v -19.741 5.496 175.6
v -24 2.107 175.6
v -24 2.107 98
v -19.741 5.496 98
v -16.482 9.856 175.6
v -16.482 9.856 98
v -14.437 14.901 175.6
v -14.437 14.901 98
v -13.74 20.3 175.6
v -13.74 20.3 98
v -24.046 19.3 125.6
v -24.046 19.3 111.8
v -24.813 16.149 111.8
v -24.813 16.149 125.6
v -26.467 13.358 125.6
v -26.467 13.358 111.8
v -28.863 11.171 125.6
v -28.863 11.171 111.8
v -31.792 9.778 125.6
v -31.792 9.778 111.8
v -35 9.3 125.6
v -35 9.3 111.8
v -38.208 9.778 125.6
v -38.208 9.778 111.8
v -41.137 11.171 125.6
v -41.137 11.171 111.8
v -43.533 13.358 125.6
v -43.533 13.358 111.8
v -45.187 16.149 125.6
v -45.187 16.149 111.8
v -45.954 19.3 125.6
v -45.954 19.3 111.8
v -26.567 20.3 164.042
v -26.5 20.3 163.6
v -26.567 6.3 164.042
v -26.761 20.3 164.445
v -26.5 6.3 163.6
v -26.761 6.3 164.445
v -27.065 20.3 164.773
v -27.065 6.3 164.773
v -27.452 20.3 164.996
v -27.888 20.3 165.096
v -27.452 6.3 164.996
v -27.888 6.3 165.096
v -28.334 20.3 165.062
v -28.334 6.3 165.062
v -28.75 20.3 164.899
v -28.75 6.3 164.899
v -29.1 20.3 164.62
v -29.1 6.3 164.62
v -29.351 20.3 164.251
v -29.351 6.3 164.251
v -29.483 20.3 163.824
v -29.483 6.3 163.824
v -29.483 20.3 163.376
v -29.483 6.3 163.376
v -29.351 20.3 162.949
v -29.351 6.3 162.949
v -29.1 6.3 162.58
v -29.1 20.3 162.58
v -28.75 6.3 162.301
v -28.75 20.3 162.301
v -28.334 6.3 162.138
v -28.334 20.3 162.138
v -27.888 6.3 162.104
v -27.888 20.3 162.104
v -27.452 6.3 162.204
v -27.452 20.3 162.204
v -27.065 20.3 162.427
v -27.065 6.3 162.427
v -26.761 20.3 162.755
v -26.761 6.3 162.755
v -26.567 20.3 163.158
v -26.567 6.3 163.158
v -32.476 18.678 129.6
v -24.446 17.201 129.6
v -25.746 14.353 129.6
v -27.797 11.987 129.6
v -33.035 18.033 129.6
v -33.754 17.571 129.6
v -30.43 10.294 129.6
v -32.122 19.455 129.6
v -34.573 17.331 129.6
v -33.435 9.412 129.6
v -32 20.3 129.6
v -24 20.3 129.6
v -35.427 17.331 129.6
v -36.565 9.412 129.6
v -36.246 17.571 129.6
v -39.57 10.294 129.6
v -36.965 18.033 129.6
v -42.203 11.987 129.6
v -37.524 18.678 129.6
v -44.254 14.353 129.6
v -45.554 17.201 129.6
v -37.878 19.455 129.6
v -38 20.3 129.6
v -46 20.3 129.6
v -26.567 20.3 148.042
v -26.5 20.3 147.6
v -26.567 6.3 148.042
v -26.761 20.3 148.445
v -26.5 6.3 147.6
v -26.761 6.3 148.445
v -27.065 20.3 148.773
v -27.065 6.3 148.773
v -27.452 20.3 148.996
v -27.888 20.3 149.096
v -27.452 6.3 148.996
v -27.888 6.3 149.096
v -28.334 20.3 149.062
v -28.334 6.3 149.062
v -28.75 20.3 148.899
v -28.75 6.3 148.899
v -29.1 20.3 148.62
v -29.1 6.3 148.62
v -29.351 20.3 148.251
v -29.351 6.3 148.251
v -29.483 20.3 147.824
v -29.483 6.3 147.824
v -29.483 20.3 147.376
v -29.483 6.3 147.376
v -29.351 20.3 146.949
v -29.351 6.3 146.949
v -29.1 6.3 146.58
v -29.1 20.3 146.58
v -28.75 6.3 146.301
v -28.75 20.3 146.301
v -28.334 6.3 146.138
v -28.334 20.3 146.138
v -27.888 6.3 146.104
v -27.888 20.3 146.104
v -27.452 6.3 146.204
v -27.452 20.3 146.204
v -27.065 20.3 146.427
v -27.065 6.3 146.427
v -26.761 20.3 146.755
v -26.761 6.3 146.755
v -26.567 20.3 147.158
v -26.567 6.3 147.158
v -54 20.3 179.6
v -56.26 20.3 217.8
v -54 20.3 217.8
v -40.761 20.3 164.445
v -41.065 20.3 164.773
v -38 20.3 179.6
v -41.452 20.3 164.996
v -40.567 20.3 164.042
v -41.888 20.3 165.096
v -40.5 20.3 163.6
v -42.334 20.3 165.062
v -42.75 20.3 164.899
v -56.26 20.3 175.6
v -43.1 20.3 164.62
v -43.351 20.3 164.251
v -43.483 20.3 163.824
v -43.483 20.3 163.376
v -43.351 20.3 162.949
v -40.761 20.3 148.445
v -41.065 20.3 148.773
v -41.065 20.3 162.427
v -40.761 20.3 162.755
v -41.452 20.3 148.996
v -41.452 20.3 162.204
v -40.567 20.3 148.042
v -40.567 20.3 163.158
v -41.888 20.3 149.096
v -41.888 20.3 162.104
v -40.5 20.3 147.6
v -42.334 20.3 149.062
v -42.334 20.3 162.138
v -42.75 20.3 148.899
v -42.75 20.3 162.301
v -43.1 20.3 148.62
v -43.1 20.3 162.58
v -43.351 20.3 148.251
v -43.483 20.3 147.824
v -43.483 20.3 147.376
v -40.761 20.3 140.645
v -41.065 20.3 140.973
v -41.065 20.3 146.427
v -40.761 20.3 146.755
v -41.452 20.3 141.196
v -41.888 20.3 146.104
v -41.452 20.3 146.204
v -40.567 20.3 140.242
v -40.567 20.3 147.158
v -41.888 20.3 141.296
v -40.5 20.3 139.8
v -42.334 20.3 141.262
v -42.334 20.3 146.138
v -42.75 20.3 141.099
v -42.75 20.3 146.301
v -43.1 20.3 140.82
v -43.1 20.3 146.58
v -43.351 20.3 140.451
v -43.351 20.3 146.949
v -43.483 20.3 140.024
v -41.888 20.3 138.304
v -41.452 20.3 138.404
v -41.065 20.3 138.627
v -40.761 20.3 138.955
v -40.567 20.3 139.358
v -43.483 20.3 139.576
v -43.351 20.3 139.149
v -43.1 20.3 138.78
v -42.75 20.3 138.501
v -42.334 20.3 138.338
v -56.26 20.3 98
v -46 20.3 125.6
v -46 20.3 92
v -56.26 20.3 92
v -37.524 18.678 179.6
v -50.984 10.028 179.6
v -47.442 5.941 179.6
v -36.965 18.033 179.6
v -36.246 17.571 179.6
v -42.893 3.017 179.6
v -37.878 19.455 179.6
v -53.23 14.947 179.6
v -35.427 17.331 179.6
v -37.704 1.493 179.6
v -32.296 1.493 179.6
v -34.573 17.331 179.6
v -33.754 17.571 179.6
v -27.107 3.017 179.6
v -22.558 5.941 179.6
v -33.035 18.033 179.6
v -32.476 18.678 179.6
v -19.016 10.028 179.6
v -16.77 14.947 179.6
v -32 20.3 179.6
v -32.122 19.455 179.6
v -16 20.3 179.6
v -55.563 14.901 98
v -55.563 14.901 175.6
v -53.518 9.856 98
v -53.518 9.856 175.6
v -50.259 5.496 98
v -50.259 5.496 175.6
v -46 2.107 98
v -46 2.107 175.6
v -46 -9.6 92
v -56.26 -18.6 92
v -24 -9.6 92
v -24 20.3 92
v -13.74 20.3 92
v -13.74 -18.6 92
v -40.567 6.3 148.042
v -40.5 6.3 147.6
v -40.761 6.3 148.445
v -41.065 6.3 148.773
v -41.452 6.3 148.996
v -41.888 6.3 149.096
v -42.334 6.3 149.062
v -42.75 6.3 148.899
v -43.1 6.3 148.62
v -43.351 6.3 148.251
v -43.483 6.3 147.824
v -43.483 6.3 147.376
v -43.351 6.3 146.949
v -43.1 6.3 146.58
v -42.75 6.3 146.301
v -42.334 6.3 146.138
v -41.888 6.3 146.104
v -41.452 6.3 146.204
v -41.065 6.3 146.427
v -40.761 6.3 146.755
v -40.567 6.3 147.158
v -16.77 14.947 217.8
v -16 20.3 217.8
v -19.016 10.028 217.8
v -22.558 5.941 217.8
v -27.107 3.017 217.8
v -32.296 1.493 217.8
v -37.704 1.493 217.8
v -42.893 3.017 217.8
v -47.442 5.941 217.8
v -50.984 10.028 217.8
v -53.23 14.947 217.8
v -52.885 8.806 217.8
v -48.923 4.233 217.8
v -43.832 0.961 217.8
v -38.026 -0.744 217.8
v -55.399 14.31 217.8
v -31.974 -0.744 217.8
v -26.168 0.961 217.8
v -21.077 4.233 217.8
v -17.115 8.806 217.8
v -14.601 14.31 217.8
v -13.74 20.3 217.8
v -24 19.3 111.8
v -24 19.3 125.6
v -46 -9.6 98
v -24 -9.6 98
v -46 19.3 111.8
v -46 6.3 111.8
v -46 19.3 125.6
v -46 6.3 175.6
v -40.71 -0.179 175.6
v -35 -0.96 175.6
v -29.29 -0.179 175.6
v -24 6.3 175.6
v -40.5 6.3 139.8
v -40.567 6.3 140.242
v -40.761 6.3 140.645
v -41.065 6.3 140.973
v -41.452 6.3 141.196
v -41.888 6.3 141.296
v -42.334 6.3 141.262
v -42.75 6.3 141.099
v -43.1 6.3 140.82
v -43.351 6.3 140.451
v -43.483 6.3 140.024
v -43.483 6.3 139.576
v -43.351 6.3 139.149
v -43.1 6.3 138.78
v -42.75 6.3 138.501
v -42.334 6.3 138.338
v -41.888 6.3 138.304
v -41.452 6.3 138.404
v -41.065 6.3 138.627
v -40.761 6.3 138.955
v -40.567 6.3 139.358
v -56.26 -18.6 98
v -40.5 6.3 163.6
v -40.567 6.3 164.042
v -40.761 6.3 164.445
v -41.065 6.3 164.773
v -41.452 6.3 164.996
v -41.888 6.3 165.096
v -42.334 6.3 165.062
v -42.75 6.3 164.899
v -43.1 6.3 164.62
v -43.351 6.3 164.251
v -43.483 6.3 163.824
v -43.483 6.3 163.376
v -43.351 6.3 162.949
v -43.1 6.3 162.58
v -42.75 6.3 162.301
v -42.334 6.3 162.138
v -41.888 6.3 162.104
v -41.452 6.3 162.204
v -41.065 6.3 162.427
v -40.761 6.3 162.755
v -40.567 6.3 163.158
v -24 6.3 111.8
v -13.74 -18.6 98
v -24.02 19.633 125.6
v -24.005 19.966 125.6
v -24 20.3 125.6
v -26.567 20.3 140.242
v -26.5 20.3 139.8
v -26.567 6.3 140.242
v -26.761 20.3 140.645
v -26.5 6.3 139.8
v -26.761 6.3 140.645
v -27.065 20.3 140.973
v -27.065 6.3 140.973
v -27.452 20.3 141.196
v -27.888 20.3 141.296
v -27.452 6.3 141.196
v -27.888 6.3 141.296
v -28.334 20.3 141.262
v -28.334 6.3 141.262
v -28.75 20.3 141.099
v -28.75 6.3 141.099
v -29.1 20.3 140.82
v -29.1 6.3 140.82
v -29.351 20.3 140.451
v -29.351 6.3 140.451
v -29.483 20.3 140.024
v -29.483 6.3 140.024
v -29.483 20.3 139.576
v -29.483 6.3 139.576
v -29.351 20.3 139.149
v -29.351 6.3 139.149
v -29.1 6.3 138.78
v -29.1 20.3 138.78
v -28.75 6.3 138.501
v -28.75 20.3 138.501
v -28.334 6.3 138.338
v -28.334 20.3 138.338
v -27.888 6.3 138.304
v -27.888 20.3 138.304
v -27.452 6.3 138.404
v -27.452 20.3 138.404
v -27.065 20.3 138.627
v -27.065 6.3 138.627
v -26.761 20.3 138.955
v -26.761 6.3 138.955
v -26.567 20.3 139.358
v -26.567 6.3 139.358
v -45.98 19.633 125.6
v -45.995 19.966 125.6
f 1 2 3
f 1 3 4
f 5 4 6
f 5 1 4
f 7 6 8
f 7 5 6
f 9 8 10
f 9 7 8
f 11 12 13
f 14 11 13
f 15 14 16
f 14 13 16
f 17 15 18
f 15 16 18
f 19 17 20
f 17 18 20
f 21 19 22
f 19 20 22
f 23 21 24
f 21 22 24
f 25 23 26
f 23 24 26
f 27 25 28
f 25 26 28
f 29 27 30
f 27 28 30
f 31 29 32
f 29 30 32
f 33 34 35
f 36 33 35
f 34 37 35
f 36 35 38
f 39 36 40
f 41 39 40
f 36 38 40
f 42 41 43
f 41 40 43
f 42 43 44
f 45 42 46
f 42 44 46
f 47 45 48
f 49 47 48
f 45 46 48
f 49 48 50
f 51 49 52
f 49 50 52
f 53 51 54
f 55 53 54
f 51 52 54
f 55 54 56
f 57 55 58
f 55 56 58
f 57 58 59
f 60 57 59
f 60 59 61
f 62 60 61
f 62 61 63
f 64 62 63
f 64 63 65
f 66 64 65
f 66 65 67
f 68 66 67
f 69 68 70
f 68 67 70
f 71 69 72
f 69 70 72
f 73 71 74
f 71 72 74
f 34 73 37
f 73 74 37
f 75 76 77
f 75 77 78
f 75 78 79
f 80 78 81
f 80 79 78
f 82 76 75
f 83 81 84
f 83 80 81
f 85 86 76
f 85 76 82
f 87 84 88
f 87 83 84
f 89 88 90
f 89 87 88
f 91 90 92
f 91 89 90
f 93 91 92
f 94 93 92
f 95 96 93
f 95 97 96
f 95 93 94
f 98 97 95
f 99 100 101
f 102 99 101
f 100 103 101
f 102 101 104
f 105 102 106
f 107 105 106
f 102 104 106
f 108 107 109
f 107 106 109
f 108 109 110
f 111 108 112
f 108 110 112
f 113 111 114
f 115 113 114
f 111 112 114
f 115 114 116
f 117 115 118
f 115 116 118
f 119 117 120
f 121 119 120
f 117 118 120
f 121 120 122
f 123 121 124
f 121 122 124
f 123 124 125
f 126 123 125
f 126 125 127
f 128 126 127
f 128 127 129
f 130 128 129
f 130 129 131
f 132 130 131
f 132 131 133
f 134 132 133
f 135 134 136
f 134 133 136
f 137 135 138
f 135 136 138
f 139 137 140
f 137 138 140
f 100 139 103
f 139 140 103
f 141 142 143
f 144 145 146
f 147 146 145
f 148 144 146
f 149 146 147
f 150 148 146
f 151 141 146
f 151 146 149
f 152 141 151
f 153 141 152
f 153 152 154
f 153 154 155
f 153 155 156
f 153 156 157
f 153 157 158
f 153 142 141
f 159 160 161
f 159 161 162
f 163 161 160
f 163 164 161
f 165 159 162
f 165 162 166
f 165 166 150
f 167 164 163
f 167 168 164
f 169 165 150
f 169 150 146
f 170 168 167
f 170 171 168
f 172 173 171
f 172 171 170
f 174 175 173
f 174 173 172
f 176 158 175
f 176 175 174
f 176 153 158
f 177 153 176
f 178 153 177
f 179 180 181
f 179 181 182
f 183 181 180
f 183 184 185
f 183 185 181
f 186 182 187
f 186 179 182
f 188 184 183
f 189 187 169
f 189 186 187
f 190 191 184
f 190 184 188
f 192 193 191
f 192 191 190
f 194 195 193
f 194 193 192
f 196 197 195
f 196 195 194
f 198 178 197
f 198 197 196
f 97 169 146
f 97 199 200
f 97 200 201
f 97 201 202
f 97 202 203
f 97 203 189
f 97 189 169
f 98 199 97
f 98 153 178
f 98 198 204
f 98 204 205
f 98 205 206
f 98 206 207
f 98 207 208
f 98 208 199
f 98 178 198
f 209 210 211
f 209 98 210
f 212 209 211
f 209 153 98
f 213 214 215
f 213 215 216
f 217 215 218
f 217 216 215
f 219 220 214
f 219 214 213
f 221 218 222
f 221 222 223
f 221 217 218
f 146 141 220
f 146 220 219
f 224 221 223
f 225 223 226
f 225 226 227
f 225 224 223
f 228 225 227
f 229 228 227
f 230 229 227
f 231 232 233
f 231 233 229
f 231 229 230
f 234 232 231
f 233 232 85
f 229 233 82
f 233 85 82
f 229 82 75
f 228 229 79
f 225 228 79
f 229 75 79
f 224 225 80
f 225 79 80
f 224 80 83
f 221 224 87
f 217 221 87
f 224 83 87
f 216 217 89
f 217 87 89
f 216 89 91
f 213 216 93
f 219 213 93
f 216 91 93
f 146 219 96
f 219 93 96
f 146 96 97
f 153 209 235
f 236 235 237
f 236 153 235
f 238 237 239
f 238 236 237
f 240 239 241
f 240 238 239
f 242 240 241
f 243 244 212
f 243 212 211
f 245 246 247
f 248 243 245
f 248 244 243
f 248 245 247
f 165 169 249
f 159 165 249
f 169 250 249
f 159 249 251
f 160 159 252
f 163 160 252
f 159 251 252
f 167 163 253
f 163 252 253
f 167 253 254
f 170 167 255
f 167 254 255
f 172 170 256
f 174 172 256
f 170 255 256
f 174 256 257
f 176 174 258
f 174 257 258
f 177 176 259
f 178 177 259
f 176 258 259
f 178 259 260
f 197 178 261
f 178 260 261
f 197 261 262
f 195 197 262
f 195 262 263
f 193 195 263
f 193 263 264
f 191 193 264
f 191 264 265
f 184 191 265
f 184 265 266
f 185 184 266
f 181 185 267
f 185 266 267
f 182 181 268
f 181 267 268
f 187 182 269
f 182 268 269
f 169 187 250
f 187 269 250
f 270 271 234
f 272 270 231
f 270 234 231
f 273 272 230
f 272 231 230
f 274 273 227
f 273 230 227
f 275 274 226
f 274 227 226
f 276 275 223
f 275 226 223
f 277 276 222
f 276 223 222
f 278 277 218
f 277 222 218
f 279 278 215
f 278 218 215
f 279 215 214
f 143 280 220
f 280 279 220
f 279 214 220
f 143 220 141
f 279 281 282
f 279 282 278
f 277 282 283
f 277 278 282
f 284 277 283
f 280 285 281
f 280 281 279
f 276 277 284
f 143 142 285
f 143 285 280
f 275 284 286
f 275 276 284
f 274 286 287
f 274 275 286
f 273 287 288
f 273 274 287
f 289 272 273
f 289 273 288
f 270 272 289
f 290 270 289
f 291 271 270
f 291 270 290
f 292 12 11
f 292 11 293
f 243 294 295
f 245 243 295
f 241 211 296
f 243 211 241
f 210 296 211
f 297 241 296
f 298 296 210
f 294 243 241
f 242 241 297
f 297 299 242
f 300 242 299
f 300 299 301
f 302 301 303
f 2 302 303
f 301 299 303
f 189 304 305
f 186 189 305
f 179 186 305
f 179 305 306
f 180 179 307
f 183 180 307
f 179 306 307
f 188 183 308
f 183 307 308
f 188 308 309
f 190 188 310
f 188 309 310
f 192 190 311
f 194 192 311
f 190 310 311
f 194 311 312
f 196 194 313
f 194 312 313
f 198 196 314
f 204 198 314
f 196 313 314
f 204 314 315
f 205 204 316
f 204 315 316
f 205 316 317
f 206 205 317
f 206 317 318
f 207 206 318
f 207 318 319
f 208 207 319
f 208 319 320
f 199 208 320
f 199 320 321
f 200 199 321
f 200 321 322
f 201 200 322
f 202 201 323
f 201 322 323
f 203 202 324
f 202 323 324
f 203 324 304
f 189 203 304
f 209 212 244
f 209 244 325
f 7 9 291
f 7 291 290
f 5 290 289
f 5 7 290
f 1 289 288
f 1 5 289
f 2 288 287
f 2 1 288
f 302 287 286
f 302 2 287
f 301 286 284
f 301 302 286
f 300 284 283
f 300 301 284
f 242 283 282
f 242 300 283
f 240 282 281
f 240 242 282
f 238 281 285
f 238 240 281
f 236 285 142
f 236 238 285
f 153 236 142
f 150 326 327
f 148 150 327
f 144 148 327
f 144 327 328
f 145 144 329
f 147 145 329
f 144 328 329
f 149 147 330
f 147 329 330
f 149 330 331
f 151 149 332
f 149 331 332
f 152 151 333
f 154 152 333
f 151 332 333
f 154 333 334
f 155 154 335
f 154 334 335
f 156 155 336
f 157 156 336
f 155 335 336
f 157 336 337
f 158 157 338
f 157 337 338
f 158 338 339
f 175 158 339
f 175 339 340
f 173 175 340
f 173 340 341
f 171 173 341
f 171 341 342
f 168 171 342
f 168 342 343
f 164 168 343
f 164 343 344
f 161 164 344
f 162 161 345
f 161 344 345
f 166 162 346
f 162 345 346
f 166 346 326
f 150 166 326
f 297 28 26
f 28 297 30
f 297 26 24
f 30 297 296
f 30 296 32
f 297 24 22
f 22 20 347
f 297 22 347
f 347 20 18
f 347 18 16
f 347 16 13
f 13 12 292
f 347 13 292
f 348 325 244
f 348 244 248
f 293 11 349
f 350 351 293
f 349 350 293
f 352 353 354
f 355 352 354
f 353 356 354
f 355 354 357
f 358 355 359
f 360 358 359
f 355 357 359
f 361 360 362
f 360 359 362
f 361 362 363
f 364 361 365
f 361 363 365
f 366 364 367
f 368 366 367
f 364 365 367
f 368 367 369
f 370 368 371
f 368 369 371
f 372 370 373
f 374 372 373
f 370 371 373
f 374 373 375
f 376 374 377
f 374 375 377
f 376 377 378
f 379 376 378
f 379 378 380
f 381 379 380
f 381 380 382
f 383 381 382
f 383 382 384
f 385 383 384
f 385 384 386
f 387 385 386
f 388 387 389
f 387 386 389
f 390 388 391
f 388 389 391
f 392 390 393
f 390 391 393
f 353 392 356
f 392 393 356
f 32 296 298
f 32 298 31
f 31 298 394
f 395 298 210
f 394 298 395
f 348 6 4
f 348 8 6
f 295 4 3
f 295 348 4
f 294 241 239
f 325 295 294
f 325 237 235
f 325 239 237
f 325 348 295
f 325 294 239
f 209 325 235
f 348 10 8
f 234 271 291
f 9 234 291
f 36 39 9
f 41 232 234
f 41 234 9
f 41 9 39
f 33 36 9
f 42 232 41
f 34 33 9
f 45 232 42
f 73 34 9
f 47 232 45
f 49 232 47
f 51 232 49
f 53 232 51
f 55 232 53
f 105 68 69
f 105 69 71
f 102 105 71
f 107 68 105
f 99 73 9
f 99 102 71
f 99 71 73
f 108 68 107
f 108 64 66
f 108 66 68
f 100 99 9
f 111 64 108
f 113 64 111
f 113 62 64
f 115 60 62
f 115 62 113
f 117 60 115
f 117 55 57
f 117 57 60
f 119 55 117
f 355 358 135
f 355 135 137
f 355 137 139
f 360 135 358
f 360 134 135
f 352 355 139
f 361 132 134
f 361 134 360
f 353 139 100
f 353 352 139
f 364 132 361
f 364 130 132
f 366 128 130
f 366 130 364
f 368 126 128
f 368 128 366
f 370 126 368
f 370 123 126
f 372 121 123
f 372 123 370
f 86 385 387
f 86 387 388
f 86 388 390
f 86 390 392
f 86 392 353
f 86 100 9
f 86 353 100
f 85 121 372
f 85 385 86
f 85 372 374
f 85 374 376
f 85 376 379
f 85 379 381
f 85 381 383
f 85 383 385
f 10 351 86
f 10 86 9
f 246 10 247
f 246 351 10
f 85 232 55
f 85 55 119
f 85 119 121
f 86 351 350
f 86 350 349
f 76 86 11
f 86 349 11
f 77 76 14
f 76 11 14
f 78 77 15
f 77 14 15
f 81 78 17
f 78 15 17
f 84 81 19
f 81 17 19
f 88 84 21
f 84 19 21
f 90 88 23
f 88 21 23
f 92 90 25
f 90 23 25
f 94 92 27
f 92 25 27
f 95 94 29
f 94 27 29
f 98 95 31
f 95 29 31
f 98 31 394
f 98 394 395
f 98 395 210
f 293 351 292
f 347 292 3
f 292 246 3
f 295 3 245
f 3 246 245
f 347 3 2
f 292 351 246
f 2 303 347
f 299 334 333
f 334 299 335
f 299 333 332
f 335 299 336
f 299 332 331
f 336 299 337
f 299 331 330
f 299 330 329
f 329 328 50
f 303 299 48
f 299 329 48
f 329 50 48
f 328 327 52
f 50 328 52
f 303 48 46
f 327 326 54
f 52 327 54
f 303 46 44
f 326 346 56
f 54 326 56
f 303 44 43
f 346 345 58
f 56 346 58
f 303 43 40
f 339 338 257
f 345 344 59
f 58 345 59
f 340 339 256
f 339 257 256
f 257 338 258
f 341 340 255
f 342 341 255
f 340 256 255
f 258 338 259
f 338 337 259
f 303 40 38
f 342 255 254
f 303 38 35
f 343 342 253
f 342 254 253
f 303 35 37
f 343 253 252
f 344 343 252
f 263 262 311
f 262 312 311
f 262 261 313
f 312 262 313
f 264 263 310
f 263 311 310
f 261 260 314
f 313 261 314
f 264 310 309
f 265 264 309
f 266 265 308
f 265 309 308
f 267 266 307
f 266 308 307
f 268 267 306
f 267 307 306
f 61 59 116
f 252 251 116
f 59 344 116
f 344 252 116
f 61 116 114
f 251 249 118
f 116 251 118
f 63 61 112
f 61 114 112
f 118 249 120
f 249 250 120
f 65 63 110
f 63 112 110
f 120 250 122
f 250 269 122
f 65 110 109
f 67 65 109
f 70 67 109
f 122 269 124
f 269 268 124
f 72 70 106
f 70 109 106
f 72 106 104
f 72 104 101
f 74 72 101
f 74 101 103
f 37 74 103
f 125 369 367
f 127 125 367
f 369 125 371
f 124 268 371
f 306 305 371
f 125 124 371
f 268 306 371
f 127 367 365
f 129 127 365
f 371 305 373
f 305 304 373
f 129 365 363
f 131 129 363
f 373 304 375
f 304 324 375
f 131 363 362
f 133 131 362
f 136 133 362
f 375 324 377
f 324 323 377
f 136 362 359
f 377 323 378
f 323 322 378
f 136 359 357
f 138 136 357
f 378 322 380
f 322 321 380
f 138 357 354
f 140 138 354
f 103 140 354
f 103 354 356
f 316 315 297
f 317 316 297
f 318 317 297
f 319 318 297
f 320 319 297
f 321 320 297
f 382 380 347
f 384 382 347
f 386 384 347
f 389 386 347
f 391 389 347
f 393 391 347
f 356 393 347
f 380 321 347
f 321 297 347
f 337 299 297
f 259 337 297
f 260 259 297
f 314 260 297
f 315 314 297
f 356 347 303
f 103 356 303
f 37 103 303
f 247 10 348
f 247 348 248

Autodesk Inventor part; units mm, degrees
ref_plane "YZ Plane" through (0, 0, 0) normal (1, 0, 0) x (0, 1, 0)
ref_plane "XZ Plane" through (0, 0, 0) normal (0, 1, 0) x (-1, 0, 0)
ref_plane "XY Plane" through (0, 0, 0) normal (0, 0, 1) x (1, 0, 0)
sketch "Sketch1" plane through (0, 0, 0) normal (0, 1, 0) x (-1, 0, 0)
  line L0 (0, 0) -> (0, 62)
  line L1 (0, 62) -> (70, 62)
  line L2 (70, 62) -> (70, 0)
  line L3 (76, 0) -> (76, 68)
  line L4 (76, 68) -> (-6, 68)
  line L5 (-6, 68) -> (-6, 0)
  line L6 (70, 0) -> (76, 0)
  line L7 (-6, 0) -> (0, 0)
  dimension "d0" = 62
  dimension "d1" = 70
  dimension "d2" = 6
  dimension "d5" = 62
extrude "Extrusion1" add sketch "Sketch1" along normal blind 40
sketch "Sketch2" plane through (6, 0, 68) normal (1, 0, 0) x (0, 0, -1)
  line L0 (68, 0) -> (68, 40) projected
  circle A0 centre (56, 25) radius 1.5
  circle A1 centre (51, 20) radius 1.5
  circle A2 centre (56, 15) radius 1.5
  circle A3 centre (61, 20) radius 1.5
  point P0 (56, 20)
  dimension "d9" = 3
  dimension "d12" = 360
extrude "Extrusion2" cut sketch "Sketch2" against normal up to surface (6 mm away)
sketch "Sketch3" plane through (-70, 0, 62) normal (1, 0, 0) x (0, 0, -1)
  line L0 (62, 0) -> (62, 40) projected
  line L1 (62, 20) -> (58, 20)
  circle A0 centre (50, 20) radius 5.75
  dimension "d16" = 4
  dimension "d18" = 11.5
extrude "Extrusion3" add sketch "Sketch3" along normal blind 5
fillet "Fillet1" radius 8 4 edges at (3, 40, 0) (3, 0, 0) (-73, 0, 0) (-73, 40, 0)
sketch "Sketch4" plane through (-76, 0, 68) normal (0, 0, 1) x (1, 0, 0)
  line L0 (41, 0) -> (41, 20)
  line L1 (30, 0) -> (30, 40)
  line L2 (76, 40) -> (6, 40) projected
  line L3 (52, 0) -> (52, 40)
  line L4 (25, 0) -> (25, 40)
  line L5 (57, 0) -> (57, 40)
  line L6 (25, 40) -> (30, 40)
  line L7 (52, 40) -> (57, 40)
  line L8 (52, 0) -> (57, 0)
  line L9 (76, 0) -> (6, 0) projected
  line L10 (30, 0) -> (25, 0)
  dimension "d22" = 11
  dimension "d23" = 11
  dimension "d24" = 5
  dimension "d25" = 5
extrude "Extrusion4" add sketch "Sketch4" along normal blind 24 contours L9 L4 L2 L1 | L2 L5 L8 L3
sketch "Sketch5" plane through (-76, 0, 92) normal (0, 0, 1) x (1, 0, 0)
  line L0 (25, 0) -> (25, 40) projected
  line L1 (57, 0) -> (57, 40) projected
  line L2 (25, 0) -> (57, 0)
  line L3 (57, 0) -> (57, 40)
  line L4 (52, 0) -> (52, 40) projected
  line L5 (57, 40) -> (52, 40)
  line L6 (30, 0) -> (52, 0) projected
  line L7 (41, 3.3) -> (41, 9.3)
  line L8 (41, 9.3) -> (52, 9.3)
  line L9 (41, 9.3) -> (30, 9.3)
  line L10 (52, 9.3) -> (52, 40)
  line L11 (76, 40) -> (6, 40) projected
  line L12 (30, 40) -> (30, 0) projected
  line L13 (30, 9.3) -> (30, 40)
  line L14 (30, 40) -> (25, 40)
  line L15 (25, 40) -> (25, 0)
  line L16 (76, 0) -> (6, 0) projected
  dimension "d29" = 6
extrude "Extrusion5" add sketch "Sketch5" along normal blind 6 contours L0 L11 L12 L2 | L12 L9 L8 L4 L2 | L4 L5 L1 L2
sketch "Sketch6" plane through (-76, 0, 98) normal (0, 0, 1) x (1, 0, 0)
  line L0 (25, 0) -> (25, 40) projected
  line L1 (25, 40) -> (25, 0)
  line L2 (57, 40) -> (57, 0) projected
  line L3 (25, 0) -> (57, 0)
  line L4 (57, 0) -> (57, 40)
  line L5 (52, 0) -> (52, 40) projected
  line L6 (57, 40) -> (52, 40)
  line L7 (30, 40) -> (25, 40) projected
  line L8 (25, 40) -> (30, 40)
  line L9 (30, 0) -> (52, 0) projected
  line L10 (30, 40) -> (30, 0)
  line L11 (30, 0) -> (52, 0)
  line L12 (52, 40) -> (52, 9.3) projected
  line L13 (52, 40) -> (52, 0)
  line L14 (25, 0) -> (57, 0) projected
  point P0 (76, 0)
extrude "Extrusion6" add sketch "Sketch6" along normal blind 13.8
sketch "Sketch8" plane through (-76, 0, 111.8) normal (0, 0, 1) x (1, 0, 0)
  line L0 (52, 9.3) -> (30, 9.3) projected
  arc A0 (30.0455, 19.3) -> (51.9545, 19.3) centre (41, 20.3) ccw
  line L1 (51.9545, 19.3) -> (52, 19.3)
  line L2 (52, 0) -> (52, 40) projected
  line L3 (30, 40) -> (52, 40) projected
  line L4 (52, 19.3) -> (52, 40)
  line L5 (57, 40) -> (52, 40) projected
  line L6 (52, 40) -> (57, 40)
  line L7 (57, 40) -> (57, 6.3)
  line L8 (57, 40) -> (57, 0) projected
  line L9 (57, 6.3) -> (25, 6.3)
  line L10 (25, 0) -> (25, 40) projected
  line L11 (0, 40) -> (25, 40) projected
  line L12 (25, 6.3) -> (25, 40)
  line L13 (25, 40) -> (30, 40)
  line L14 (30, 40) -> (30, 19.3)
  line L15 (30, 40) -> (30, 0) projected
  line L16 (30, 19.3) -> (30.0455, 19.3)
  point P0 (76, 0)
  dimension "d37" = 33.7
  dimension "d38" = 11
extrude "Extrusion7" add sketch "Sketch8" along normal blind 13.8 contours L2 L9 L15 L0 | L0 A0 L1 L2 | L2 L5 L7 L9 | L0 L15 L16 A0 | L15 L9 L10 L13 L14
sketch "Sketch9" plane through (-76, 0, 125.6) normal (0, 0, 1) x (1, 0, 0)
  line L0 (25, 6.3) -> (57, 6.3) projected
  arc A0 (30.0455, 19.3) -> (51.9545, 19.3) centre (41, 20.3) ccw projected
  arc A1 (38, 20.3) -> (44, 20.3) centre (41, 20.3) ccw
  line L1 (25, 40) -> (25, 6.3) projected
  line L2 (25, 6.3) -> (25, 40)
  line L3 (57, 6.3) -> (57, 40) projected
  line L4 (25, 40) -> (57, 40)
  line L5 (38, 20.3) -> (30, 20.3)
  line L6 (30, 19.3) -> (30, 40) projected
  line L7 (44, 20.3) -> (52, 20.3)
  line L8 (52, 40) -> (52, 20.3)
  line L9 (52, 40) -> (57, 40)
  line L10 (57, 40) -> (57, 6.3)
  line L11 (57, 6.3) -> (25, 6.3)
  point P0 (76, 0)
  dimension "d41" = 6
extrude "Extrusion8" add sketch "Sketch9" along normal blind 50 contours L1 L4 L6 L5 A1 L7 L8 L3 L0
sketch "Sketch10" plane through (0, 40, 0) normal (0, 1, 0) x (1, 0, 0)
  line L0 (-24, -98) -> (-46, -98) projected
  line L1 (-46, -98) -> (-24, -98)
  line L2 (-24, -175.6) -> (-46, -175.6)
  line L3 (-19, -68) -> (-19, -175.6) projected
  line L4 (-19, -175.6) -> (-24, -175.6)
  line L5 (-24, -175.6) -> (-24, -98)
  line L6 (-24, -98) -> (-19, -98)
  line L7 (-19, -98) -> (-19, -175.6)
  line L8 (-51, -175.6) -> (-19, -175.6) projected
  line L9 (-51, -175.6) -> (-46, -175.6)
  line L10 (-46, -98) -> (-51, -98)
  line L11 (-51, -98) -> (-51, -175.6)
  point P0 (0, 0)
extrude "Extrusion9" cut sketch "Sketch10" against normal up to surface (19.7 mm away)
sketch "Sketch11" plane through (-76, 0, 175.6) normal (0, 0, 1) x (1, 0, 0)
  arc A0 (38, 20.3) -> (44, 20.3) centre (41, 20.3) ccw projected
  line L0 (52, 20.3) -> (44, 20.3) projected
  arc A1 (19.7397, 20.3) -> (62.2603, 20.3) centre (41, 20.3) ccw
  arc A2 (38, 20.3) -> (44, 20.3) centre (41, 20.3) ccw
  line L1 (19.7397, 20.3) -> (38, 20.3)
  line L2 (44, 20.3) -> (62.2603, 20.3)
  point P0 (76, 0)
extrude "Extrusion10" add sketch "Sketch11" along normal blind 36
sketch "Sketch12" plane through (-76, 0, 211.6) normal (0, 0, 1) x (1, 0, 0)
  arc A0 (38, 20.3) -> (44, 20.3) centre (41, 20.3) ccw projected
  circle A1 centre (41, 20.3) radius 19
  point P0 (76, 0)
  dimension "d49" = 38
extrude "Extrusion11" cut sketch "Sketch12" against normal blind 32
sketch "Sketch13" plane through (-76, 0, 211.6) normal (0, 0, 1) x (1, 0, 0)
  line L0 (62.2603, 20.3) -> (57, 20.3) projected
  arc A0 (19.7397, 20.3) -> (62.2603, 20.3) centre (41, 20.3) ccw
  line L1 (22, 20.3) -> (38, 20.3) projected
  arc A1 (22, 20.3) -> (60, 20.3) centre (41, 20.3) ccw projected
  arc A2 (22, 20.3) -> (60, 20.3) centre (41, 20.3) ccw
  line L2 (19.7397, 20.3) -> (22, 20.3)
  line L3 (62.2603, 20.3) -> (60, 20.3)
  point P0 (76, 0)
extrude "Extrusion12" add sketch "Sketch13" along normal blind 6.2
fillet "Fillet3" radius 1 5 edges at (-76, 20, 68) (-35, 40, 68) (-6.5, 40, 68) (-63.5, 40, 68) (6, 20, 68)
sketch "Sketch20" plane through (-19, 0, 111.8) normal (1, 0, 0) x (0, 0, -1)
  line L0 (0, 6.3) -> (-63.8, 6.3) projected
  line L1 (0, 6.3) -> (0, 0) projected
  line L2 (-63.8, 6.3) -> (0, 6.3)
  line L3 (0, 6.3) -> (0, 0)
  line L4 (0, 0) -> (-63.8, 0)
  line L5 (-63.8, 0) -> (-63.8, 6.3)
  point P0 (111.8, 0)
extrude "Extrusion19" add sketch "Sketch20" against normal up to surface (5 mm away)
sketch "Sketch21" plane through (-51, 0, 68) normal (-1, 0, 0) x (0, 0, 1)
  line L0 (43.8, 6.3) -> (107.6, 6.3) projected
  line L1 (0, 0) -> (107.6, 0) projected
  line L2 (43.8, 6.3) -> (107.6, 6.3)
  line L3 (107.6, 6.3) -> (107.6, 0)
  line L4 (107.6, 0) -> (43.8, 0)
  line L5 (43.8, 0) -> (43.8, 6.3)
  point P0 (-68, 0)
  point P1 (107.6, 6.3)
  point P2 (43.8, 0)
extrude "Extrusion20" add sketch "Sketch21" against normal up to surface (5 mm away)
sketch "Sketch22" plane through (-51, 20.3, 98) normal (-1, 0, 0) x (0, 0, 1)
  line L0 (-31, 19.7) -> (0, 19.7) projected
  line L1 (-31, 19.7) -> (0, 19.7)
  line L2 (0, 0) -> (27.6, 0) projected
  line L3 (0, 19.7) -> (0, 0)
  line L4 (77.6, 0) -> (119.8, 0) projected
  line L5 (0, 0) -> (77.6, 0)
  line L6 (-30, -20.3) -> (77.6, -20.3) projected
  line L7 (77.6, 0) -> (77.6, -20.3)
  line L8 (-31, 19.7) -> (-31, -20.3) projected
  line L9 (77.6, -20.3) -> (-31, -20.3)
  line L10 (-31, -20.3) -> (-31, 19.7)
  point P0 (-98, -20.3)
extrude "Extrusion21" add sketch "Sketch22" along normal up to surface (5.2603 mm away)
sketch "Sketch23" plane through (-19, 20.3, 98) normal (1, 0, 0) x (0, 0, -1)
  line L0 (31, 19.7) -> (0, 19.7) projected
  line L1 (0, 19.7) -> (0, 0) projected
  line L2 (0, 19.7) -> (0, 0)
  line L3 (0, 0) -> (-77.6, 0) projected
  line L4 (0, 0) -> (-77.6, 0)
  line L5 (-77.6, -20.3) -> (-77.6, -18.1934) projected
  line L6 (-77.6, 0) -> (-77.6, -20.3)
  line L7 (31, 19.7) -> (31, -20.3) projected
  line L8 (-77.6, -20.3) -> (31, -20.3)
  line L9 (31, -20.3) -> (31, 19.7)
  line L10 (31, 19.7) -> (0, 19.7)
  point P0 (98, -20.3)
extrude "Extrusion22" add sketch "Sketch23" along normal up to surface (5.2603 mm away)
sketch "Sketch24" plane through (-24, 0, 175.6) normal (0, 0, 1) x (1, 0, 0)
  line L0 (0, 2.1066) -> (0, 0) projected
  line L1 (0, 20.3) -> (10.2603, 20.3) projected
  arc A0 (0, 2.1066) -> (10.2603, 20.3) centre (-11, 20.3) ccw
  line L2 (-32.2603, 20.3) -> (-32.2603, 0) projected
  line L3 (-22, 0) -> (-22, 2.1066) projected
  arc A1 (-32.2603, 20.3) -> (-22, 2.1066) centre (-11, 20.3) ccw
  line L4 (-32.2603, 20.3) -> (-32.2603, 0)
  line L5 (24, 0) -> (-46, 0) projected
  line L6 (-22, 0) -> (-32.2603, 0)
  line L7 (-22, 0) -> (-22, 2.1066)
  line L8 (0, 0) -> (0, 2.1066)
  line L9 (10.2603, 39) -> (10.2603, 0) projected
  line L10 (10.2603, 0) -> (0, 0)
  arc A2 (0, 2.1066) -> (10.2603, 20.3) centre (-11, 20.3) ccw projected
  line L11 (10.2603, 0) -> (10.2603, 20.3)
extrude "Extrusion23" cut sketch "Sketch24" against normal up to surface (77.6 mm away)
sketch "Sketch25" plane through (-56.2603, 0, 68) normal (-1, 0, 0) x (0, 0, 1)
  line L0 (24, 9.3) -> (24, 0) projected
  line L1 (24, 0) -> (24, 40)
  line L2 (-1, 40) -> (30, 40) projected
  line L3 (24, 40) -> (-68, 40)
  line L4 (-68, 8) -> (-68, 32) projected
  line L5 (-68, 40) -> (-68, 0)
  line L6 (-68, 0) -> (24, 0)
extrude "Extrusion24" cut sketch "Sketch25" along normal mid plane 150
sketch "Sketch26" plane through (-56.2603, 0, 92) normal (-1, 0, 0) x (0, 0, 1)
  line L0 (6, 40) -> (0, 40) projected
  line L1 (6, 20.3) -> (6, 40) projected
  line L2 (0, 40) -> (6, 40)
  line L3 (6, 40) -> (6, 20.3)
  line L4 (6, 20.3) -> (0, 20.3)
  line L5 (0, 20.3) -> (0, 40)
  point P0 (-92, 0)
extrude "Extrusion25" cut sketch "Sketch26" against normal up to surface (42.5206 mm away)
sketch "Sketch28" plane through (-46, 6.3, 111.8) normal (0, -1, 0) x (1, 0, 0)
  line L0 (22, 63.8) -> (0, 63.8) projected
  line L1 (0, 63.8) -> (8, 63.8)
  line L2 (8, 13.8) -> (8, 67.8) projected
  line L3 (0.0455, 0) -> (21.9545, 0) projected
  circle A0 centre (18, 28) radius 1.5
  circle A1 centre (18, 35.8) radius 1.5
  circle A2 centre (18, 51.8) radius 1.5
  circle A3 centre (4, 28) radius 1.5
  circle A4 centre (4, 35.8) radius 1.5
  circle A5 centre (4, 51.8) radius 1.5
  point P0 (46, -111.8)
extrude "Extrusion27" cut sketch "Sketch28" against normal through all
sketch "Sketch29" plane through (0, 0, 0) normal (0, -1, 0) x (1, 0, 0)
  line L0 (-24, 98) -> (-46, 98) projected
  line L1 (-24, 125.6) -> (-24, 92) projected
  line L2 (-46, 98) -> (-24, 98)
  line L3 (-24, 98) -> (-24, 92)
  line L4 (-24, 92) -> (-46, 92)
  line L5 (-46, 92) -> (-46, 98)
  point P0 (0, 0)
extrude "Extrusion28" cut sketch "Sketch29" against normal up to surface (9.3 mm away)
sketch "Sketch30" plane through (0, 0, 0) normal (0, -1, 0) x (1, 0, 0)
  line L0 (-13.7397, 98) -> (-13.7397, 217.8) projected
  line L1 (-24, 92) -> (-13.7397, 92) projected
  line L2 (-13.7397, 98) -> (-24, 98)
  line L3 (-24, 98) -> (-24, 92)
  line L4 (-24, 92) -> (-13.7397, 92)
  line L5 (-13.7397, 92) -> (-13.7397, 98)
  line L6 (-46, 175.6) -> (-46, 98) projected
  line L7 (-56.2603, 92) -> (-46, 92) projected
  line L8 (-46, 98) -> (-56.2603, 98)
  line L9 (-56.2603, 98) -> (-56.2603, 92)
  line L10 (-56.2603, 92) -> (-46, 92)
  line L11 (-46, 92) -> (-46, 98)
  point P0 (0, 0)
extrude "Extrusion29" add sketch "Sketch30" along normal blind 18.6
sketch "Sketch31" plane through (0, -18.6, 0) normal (0, -1, 0) x (1, 0, 0)
  line L0 (-13.7397, 98) -> (-24, 98) projected
  line L1 (-56.2603, 92) -> (-46, 92) projected
  line L2 (-24, 98) -> (-46, 98)
  line L3 (-46, 98) -> (-46, 92)
  line L4 (-46, 92) -> (-24, 92)
  line L5 (-24, 92) -> (-24, 98)
  point P0 (0, 0)
extrude "Extrusion30" add sketch "Sketch31" against normal blind 9
sketch "Sketch32" plane through (-76, 0, 125.6) normal (0, 0, -1) x (-1, 0, 0)
  line L0 (-44, 20.3) -> (-60, 20.3) projected
  line L1 (-52, 20.3) -> (-44, 20.3)
  arc A0 (-44, 20.3) -> (-38, 20.3) centre (-41, 20.3) ccw projected
  line L2 (-38, 20.3) -> (-30, 20.3)
  line L3 (-22, 20.3) -> (-38, 20.3) projected
  arc A1 (-52, 20.3) -> (-30, 20.3) centre (-41, 20.3) ccw
  arc A2 (-44, 20.3) -> (-38, 20.3) centre (-41, 20.3) ccw
  point P0 (-76, 0)
extrude "Extrusion31" cut sketch "Sketch32" against normal blind 4
properties part number "Tilt_Bracket_Output_2_Lid"
